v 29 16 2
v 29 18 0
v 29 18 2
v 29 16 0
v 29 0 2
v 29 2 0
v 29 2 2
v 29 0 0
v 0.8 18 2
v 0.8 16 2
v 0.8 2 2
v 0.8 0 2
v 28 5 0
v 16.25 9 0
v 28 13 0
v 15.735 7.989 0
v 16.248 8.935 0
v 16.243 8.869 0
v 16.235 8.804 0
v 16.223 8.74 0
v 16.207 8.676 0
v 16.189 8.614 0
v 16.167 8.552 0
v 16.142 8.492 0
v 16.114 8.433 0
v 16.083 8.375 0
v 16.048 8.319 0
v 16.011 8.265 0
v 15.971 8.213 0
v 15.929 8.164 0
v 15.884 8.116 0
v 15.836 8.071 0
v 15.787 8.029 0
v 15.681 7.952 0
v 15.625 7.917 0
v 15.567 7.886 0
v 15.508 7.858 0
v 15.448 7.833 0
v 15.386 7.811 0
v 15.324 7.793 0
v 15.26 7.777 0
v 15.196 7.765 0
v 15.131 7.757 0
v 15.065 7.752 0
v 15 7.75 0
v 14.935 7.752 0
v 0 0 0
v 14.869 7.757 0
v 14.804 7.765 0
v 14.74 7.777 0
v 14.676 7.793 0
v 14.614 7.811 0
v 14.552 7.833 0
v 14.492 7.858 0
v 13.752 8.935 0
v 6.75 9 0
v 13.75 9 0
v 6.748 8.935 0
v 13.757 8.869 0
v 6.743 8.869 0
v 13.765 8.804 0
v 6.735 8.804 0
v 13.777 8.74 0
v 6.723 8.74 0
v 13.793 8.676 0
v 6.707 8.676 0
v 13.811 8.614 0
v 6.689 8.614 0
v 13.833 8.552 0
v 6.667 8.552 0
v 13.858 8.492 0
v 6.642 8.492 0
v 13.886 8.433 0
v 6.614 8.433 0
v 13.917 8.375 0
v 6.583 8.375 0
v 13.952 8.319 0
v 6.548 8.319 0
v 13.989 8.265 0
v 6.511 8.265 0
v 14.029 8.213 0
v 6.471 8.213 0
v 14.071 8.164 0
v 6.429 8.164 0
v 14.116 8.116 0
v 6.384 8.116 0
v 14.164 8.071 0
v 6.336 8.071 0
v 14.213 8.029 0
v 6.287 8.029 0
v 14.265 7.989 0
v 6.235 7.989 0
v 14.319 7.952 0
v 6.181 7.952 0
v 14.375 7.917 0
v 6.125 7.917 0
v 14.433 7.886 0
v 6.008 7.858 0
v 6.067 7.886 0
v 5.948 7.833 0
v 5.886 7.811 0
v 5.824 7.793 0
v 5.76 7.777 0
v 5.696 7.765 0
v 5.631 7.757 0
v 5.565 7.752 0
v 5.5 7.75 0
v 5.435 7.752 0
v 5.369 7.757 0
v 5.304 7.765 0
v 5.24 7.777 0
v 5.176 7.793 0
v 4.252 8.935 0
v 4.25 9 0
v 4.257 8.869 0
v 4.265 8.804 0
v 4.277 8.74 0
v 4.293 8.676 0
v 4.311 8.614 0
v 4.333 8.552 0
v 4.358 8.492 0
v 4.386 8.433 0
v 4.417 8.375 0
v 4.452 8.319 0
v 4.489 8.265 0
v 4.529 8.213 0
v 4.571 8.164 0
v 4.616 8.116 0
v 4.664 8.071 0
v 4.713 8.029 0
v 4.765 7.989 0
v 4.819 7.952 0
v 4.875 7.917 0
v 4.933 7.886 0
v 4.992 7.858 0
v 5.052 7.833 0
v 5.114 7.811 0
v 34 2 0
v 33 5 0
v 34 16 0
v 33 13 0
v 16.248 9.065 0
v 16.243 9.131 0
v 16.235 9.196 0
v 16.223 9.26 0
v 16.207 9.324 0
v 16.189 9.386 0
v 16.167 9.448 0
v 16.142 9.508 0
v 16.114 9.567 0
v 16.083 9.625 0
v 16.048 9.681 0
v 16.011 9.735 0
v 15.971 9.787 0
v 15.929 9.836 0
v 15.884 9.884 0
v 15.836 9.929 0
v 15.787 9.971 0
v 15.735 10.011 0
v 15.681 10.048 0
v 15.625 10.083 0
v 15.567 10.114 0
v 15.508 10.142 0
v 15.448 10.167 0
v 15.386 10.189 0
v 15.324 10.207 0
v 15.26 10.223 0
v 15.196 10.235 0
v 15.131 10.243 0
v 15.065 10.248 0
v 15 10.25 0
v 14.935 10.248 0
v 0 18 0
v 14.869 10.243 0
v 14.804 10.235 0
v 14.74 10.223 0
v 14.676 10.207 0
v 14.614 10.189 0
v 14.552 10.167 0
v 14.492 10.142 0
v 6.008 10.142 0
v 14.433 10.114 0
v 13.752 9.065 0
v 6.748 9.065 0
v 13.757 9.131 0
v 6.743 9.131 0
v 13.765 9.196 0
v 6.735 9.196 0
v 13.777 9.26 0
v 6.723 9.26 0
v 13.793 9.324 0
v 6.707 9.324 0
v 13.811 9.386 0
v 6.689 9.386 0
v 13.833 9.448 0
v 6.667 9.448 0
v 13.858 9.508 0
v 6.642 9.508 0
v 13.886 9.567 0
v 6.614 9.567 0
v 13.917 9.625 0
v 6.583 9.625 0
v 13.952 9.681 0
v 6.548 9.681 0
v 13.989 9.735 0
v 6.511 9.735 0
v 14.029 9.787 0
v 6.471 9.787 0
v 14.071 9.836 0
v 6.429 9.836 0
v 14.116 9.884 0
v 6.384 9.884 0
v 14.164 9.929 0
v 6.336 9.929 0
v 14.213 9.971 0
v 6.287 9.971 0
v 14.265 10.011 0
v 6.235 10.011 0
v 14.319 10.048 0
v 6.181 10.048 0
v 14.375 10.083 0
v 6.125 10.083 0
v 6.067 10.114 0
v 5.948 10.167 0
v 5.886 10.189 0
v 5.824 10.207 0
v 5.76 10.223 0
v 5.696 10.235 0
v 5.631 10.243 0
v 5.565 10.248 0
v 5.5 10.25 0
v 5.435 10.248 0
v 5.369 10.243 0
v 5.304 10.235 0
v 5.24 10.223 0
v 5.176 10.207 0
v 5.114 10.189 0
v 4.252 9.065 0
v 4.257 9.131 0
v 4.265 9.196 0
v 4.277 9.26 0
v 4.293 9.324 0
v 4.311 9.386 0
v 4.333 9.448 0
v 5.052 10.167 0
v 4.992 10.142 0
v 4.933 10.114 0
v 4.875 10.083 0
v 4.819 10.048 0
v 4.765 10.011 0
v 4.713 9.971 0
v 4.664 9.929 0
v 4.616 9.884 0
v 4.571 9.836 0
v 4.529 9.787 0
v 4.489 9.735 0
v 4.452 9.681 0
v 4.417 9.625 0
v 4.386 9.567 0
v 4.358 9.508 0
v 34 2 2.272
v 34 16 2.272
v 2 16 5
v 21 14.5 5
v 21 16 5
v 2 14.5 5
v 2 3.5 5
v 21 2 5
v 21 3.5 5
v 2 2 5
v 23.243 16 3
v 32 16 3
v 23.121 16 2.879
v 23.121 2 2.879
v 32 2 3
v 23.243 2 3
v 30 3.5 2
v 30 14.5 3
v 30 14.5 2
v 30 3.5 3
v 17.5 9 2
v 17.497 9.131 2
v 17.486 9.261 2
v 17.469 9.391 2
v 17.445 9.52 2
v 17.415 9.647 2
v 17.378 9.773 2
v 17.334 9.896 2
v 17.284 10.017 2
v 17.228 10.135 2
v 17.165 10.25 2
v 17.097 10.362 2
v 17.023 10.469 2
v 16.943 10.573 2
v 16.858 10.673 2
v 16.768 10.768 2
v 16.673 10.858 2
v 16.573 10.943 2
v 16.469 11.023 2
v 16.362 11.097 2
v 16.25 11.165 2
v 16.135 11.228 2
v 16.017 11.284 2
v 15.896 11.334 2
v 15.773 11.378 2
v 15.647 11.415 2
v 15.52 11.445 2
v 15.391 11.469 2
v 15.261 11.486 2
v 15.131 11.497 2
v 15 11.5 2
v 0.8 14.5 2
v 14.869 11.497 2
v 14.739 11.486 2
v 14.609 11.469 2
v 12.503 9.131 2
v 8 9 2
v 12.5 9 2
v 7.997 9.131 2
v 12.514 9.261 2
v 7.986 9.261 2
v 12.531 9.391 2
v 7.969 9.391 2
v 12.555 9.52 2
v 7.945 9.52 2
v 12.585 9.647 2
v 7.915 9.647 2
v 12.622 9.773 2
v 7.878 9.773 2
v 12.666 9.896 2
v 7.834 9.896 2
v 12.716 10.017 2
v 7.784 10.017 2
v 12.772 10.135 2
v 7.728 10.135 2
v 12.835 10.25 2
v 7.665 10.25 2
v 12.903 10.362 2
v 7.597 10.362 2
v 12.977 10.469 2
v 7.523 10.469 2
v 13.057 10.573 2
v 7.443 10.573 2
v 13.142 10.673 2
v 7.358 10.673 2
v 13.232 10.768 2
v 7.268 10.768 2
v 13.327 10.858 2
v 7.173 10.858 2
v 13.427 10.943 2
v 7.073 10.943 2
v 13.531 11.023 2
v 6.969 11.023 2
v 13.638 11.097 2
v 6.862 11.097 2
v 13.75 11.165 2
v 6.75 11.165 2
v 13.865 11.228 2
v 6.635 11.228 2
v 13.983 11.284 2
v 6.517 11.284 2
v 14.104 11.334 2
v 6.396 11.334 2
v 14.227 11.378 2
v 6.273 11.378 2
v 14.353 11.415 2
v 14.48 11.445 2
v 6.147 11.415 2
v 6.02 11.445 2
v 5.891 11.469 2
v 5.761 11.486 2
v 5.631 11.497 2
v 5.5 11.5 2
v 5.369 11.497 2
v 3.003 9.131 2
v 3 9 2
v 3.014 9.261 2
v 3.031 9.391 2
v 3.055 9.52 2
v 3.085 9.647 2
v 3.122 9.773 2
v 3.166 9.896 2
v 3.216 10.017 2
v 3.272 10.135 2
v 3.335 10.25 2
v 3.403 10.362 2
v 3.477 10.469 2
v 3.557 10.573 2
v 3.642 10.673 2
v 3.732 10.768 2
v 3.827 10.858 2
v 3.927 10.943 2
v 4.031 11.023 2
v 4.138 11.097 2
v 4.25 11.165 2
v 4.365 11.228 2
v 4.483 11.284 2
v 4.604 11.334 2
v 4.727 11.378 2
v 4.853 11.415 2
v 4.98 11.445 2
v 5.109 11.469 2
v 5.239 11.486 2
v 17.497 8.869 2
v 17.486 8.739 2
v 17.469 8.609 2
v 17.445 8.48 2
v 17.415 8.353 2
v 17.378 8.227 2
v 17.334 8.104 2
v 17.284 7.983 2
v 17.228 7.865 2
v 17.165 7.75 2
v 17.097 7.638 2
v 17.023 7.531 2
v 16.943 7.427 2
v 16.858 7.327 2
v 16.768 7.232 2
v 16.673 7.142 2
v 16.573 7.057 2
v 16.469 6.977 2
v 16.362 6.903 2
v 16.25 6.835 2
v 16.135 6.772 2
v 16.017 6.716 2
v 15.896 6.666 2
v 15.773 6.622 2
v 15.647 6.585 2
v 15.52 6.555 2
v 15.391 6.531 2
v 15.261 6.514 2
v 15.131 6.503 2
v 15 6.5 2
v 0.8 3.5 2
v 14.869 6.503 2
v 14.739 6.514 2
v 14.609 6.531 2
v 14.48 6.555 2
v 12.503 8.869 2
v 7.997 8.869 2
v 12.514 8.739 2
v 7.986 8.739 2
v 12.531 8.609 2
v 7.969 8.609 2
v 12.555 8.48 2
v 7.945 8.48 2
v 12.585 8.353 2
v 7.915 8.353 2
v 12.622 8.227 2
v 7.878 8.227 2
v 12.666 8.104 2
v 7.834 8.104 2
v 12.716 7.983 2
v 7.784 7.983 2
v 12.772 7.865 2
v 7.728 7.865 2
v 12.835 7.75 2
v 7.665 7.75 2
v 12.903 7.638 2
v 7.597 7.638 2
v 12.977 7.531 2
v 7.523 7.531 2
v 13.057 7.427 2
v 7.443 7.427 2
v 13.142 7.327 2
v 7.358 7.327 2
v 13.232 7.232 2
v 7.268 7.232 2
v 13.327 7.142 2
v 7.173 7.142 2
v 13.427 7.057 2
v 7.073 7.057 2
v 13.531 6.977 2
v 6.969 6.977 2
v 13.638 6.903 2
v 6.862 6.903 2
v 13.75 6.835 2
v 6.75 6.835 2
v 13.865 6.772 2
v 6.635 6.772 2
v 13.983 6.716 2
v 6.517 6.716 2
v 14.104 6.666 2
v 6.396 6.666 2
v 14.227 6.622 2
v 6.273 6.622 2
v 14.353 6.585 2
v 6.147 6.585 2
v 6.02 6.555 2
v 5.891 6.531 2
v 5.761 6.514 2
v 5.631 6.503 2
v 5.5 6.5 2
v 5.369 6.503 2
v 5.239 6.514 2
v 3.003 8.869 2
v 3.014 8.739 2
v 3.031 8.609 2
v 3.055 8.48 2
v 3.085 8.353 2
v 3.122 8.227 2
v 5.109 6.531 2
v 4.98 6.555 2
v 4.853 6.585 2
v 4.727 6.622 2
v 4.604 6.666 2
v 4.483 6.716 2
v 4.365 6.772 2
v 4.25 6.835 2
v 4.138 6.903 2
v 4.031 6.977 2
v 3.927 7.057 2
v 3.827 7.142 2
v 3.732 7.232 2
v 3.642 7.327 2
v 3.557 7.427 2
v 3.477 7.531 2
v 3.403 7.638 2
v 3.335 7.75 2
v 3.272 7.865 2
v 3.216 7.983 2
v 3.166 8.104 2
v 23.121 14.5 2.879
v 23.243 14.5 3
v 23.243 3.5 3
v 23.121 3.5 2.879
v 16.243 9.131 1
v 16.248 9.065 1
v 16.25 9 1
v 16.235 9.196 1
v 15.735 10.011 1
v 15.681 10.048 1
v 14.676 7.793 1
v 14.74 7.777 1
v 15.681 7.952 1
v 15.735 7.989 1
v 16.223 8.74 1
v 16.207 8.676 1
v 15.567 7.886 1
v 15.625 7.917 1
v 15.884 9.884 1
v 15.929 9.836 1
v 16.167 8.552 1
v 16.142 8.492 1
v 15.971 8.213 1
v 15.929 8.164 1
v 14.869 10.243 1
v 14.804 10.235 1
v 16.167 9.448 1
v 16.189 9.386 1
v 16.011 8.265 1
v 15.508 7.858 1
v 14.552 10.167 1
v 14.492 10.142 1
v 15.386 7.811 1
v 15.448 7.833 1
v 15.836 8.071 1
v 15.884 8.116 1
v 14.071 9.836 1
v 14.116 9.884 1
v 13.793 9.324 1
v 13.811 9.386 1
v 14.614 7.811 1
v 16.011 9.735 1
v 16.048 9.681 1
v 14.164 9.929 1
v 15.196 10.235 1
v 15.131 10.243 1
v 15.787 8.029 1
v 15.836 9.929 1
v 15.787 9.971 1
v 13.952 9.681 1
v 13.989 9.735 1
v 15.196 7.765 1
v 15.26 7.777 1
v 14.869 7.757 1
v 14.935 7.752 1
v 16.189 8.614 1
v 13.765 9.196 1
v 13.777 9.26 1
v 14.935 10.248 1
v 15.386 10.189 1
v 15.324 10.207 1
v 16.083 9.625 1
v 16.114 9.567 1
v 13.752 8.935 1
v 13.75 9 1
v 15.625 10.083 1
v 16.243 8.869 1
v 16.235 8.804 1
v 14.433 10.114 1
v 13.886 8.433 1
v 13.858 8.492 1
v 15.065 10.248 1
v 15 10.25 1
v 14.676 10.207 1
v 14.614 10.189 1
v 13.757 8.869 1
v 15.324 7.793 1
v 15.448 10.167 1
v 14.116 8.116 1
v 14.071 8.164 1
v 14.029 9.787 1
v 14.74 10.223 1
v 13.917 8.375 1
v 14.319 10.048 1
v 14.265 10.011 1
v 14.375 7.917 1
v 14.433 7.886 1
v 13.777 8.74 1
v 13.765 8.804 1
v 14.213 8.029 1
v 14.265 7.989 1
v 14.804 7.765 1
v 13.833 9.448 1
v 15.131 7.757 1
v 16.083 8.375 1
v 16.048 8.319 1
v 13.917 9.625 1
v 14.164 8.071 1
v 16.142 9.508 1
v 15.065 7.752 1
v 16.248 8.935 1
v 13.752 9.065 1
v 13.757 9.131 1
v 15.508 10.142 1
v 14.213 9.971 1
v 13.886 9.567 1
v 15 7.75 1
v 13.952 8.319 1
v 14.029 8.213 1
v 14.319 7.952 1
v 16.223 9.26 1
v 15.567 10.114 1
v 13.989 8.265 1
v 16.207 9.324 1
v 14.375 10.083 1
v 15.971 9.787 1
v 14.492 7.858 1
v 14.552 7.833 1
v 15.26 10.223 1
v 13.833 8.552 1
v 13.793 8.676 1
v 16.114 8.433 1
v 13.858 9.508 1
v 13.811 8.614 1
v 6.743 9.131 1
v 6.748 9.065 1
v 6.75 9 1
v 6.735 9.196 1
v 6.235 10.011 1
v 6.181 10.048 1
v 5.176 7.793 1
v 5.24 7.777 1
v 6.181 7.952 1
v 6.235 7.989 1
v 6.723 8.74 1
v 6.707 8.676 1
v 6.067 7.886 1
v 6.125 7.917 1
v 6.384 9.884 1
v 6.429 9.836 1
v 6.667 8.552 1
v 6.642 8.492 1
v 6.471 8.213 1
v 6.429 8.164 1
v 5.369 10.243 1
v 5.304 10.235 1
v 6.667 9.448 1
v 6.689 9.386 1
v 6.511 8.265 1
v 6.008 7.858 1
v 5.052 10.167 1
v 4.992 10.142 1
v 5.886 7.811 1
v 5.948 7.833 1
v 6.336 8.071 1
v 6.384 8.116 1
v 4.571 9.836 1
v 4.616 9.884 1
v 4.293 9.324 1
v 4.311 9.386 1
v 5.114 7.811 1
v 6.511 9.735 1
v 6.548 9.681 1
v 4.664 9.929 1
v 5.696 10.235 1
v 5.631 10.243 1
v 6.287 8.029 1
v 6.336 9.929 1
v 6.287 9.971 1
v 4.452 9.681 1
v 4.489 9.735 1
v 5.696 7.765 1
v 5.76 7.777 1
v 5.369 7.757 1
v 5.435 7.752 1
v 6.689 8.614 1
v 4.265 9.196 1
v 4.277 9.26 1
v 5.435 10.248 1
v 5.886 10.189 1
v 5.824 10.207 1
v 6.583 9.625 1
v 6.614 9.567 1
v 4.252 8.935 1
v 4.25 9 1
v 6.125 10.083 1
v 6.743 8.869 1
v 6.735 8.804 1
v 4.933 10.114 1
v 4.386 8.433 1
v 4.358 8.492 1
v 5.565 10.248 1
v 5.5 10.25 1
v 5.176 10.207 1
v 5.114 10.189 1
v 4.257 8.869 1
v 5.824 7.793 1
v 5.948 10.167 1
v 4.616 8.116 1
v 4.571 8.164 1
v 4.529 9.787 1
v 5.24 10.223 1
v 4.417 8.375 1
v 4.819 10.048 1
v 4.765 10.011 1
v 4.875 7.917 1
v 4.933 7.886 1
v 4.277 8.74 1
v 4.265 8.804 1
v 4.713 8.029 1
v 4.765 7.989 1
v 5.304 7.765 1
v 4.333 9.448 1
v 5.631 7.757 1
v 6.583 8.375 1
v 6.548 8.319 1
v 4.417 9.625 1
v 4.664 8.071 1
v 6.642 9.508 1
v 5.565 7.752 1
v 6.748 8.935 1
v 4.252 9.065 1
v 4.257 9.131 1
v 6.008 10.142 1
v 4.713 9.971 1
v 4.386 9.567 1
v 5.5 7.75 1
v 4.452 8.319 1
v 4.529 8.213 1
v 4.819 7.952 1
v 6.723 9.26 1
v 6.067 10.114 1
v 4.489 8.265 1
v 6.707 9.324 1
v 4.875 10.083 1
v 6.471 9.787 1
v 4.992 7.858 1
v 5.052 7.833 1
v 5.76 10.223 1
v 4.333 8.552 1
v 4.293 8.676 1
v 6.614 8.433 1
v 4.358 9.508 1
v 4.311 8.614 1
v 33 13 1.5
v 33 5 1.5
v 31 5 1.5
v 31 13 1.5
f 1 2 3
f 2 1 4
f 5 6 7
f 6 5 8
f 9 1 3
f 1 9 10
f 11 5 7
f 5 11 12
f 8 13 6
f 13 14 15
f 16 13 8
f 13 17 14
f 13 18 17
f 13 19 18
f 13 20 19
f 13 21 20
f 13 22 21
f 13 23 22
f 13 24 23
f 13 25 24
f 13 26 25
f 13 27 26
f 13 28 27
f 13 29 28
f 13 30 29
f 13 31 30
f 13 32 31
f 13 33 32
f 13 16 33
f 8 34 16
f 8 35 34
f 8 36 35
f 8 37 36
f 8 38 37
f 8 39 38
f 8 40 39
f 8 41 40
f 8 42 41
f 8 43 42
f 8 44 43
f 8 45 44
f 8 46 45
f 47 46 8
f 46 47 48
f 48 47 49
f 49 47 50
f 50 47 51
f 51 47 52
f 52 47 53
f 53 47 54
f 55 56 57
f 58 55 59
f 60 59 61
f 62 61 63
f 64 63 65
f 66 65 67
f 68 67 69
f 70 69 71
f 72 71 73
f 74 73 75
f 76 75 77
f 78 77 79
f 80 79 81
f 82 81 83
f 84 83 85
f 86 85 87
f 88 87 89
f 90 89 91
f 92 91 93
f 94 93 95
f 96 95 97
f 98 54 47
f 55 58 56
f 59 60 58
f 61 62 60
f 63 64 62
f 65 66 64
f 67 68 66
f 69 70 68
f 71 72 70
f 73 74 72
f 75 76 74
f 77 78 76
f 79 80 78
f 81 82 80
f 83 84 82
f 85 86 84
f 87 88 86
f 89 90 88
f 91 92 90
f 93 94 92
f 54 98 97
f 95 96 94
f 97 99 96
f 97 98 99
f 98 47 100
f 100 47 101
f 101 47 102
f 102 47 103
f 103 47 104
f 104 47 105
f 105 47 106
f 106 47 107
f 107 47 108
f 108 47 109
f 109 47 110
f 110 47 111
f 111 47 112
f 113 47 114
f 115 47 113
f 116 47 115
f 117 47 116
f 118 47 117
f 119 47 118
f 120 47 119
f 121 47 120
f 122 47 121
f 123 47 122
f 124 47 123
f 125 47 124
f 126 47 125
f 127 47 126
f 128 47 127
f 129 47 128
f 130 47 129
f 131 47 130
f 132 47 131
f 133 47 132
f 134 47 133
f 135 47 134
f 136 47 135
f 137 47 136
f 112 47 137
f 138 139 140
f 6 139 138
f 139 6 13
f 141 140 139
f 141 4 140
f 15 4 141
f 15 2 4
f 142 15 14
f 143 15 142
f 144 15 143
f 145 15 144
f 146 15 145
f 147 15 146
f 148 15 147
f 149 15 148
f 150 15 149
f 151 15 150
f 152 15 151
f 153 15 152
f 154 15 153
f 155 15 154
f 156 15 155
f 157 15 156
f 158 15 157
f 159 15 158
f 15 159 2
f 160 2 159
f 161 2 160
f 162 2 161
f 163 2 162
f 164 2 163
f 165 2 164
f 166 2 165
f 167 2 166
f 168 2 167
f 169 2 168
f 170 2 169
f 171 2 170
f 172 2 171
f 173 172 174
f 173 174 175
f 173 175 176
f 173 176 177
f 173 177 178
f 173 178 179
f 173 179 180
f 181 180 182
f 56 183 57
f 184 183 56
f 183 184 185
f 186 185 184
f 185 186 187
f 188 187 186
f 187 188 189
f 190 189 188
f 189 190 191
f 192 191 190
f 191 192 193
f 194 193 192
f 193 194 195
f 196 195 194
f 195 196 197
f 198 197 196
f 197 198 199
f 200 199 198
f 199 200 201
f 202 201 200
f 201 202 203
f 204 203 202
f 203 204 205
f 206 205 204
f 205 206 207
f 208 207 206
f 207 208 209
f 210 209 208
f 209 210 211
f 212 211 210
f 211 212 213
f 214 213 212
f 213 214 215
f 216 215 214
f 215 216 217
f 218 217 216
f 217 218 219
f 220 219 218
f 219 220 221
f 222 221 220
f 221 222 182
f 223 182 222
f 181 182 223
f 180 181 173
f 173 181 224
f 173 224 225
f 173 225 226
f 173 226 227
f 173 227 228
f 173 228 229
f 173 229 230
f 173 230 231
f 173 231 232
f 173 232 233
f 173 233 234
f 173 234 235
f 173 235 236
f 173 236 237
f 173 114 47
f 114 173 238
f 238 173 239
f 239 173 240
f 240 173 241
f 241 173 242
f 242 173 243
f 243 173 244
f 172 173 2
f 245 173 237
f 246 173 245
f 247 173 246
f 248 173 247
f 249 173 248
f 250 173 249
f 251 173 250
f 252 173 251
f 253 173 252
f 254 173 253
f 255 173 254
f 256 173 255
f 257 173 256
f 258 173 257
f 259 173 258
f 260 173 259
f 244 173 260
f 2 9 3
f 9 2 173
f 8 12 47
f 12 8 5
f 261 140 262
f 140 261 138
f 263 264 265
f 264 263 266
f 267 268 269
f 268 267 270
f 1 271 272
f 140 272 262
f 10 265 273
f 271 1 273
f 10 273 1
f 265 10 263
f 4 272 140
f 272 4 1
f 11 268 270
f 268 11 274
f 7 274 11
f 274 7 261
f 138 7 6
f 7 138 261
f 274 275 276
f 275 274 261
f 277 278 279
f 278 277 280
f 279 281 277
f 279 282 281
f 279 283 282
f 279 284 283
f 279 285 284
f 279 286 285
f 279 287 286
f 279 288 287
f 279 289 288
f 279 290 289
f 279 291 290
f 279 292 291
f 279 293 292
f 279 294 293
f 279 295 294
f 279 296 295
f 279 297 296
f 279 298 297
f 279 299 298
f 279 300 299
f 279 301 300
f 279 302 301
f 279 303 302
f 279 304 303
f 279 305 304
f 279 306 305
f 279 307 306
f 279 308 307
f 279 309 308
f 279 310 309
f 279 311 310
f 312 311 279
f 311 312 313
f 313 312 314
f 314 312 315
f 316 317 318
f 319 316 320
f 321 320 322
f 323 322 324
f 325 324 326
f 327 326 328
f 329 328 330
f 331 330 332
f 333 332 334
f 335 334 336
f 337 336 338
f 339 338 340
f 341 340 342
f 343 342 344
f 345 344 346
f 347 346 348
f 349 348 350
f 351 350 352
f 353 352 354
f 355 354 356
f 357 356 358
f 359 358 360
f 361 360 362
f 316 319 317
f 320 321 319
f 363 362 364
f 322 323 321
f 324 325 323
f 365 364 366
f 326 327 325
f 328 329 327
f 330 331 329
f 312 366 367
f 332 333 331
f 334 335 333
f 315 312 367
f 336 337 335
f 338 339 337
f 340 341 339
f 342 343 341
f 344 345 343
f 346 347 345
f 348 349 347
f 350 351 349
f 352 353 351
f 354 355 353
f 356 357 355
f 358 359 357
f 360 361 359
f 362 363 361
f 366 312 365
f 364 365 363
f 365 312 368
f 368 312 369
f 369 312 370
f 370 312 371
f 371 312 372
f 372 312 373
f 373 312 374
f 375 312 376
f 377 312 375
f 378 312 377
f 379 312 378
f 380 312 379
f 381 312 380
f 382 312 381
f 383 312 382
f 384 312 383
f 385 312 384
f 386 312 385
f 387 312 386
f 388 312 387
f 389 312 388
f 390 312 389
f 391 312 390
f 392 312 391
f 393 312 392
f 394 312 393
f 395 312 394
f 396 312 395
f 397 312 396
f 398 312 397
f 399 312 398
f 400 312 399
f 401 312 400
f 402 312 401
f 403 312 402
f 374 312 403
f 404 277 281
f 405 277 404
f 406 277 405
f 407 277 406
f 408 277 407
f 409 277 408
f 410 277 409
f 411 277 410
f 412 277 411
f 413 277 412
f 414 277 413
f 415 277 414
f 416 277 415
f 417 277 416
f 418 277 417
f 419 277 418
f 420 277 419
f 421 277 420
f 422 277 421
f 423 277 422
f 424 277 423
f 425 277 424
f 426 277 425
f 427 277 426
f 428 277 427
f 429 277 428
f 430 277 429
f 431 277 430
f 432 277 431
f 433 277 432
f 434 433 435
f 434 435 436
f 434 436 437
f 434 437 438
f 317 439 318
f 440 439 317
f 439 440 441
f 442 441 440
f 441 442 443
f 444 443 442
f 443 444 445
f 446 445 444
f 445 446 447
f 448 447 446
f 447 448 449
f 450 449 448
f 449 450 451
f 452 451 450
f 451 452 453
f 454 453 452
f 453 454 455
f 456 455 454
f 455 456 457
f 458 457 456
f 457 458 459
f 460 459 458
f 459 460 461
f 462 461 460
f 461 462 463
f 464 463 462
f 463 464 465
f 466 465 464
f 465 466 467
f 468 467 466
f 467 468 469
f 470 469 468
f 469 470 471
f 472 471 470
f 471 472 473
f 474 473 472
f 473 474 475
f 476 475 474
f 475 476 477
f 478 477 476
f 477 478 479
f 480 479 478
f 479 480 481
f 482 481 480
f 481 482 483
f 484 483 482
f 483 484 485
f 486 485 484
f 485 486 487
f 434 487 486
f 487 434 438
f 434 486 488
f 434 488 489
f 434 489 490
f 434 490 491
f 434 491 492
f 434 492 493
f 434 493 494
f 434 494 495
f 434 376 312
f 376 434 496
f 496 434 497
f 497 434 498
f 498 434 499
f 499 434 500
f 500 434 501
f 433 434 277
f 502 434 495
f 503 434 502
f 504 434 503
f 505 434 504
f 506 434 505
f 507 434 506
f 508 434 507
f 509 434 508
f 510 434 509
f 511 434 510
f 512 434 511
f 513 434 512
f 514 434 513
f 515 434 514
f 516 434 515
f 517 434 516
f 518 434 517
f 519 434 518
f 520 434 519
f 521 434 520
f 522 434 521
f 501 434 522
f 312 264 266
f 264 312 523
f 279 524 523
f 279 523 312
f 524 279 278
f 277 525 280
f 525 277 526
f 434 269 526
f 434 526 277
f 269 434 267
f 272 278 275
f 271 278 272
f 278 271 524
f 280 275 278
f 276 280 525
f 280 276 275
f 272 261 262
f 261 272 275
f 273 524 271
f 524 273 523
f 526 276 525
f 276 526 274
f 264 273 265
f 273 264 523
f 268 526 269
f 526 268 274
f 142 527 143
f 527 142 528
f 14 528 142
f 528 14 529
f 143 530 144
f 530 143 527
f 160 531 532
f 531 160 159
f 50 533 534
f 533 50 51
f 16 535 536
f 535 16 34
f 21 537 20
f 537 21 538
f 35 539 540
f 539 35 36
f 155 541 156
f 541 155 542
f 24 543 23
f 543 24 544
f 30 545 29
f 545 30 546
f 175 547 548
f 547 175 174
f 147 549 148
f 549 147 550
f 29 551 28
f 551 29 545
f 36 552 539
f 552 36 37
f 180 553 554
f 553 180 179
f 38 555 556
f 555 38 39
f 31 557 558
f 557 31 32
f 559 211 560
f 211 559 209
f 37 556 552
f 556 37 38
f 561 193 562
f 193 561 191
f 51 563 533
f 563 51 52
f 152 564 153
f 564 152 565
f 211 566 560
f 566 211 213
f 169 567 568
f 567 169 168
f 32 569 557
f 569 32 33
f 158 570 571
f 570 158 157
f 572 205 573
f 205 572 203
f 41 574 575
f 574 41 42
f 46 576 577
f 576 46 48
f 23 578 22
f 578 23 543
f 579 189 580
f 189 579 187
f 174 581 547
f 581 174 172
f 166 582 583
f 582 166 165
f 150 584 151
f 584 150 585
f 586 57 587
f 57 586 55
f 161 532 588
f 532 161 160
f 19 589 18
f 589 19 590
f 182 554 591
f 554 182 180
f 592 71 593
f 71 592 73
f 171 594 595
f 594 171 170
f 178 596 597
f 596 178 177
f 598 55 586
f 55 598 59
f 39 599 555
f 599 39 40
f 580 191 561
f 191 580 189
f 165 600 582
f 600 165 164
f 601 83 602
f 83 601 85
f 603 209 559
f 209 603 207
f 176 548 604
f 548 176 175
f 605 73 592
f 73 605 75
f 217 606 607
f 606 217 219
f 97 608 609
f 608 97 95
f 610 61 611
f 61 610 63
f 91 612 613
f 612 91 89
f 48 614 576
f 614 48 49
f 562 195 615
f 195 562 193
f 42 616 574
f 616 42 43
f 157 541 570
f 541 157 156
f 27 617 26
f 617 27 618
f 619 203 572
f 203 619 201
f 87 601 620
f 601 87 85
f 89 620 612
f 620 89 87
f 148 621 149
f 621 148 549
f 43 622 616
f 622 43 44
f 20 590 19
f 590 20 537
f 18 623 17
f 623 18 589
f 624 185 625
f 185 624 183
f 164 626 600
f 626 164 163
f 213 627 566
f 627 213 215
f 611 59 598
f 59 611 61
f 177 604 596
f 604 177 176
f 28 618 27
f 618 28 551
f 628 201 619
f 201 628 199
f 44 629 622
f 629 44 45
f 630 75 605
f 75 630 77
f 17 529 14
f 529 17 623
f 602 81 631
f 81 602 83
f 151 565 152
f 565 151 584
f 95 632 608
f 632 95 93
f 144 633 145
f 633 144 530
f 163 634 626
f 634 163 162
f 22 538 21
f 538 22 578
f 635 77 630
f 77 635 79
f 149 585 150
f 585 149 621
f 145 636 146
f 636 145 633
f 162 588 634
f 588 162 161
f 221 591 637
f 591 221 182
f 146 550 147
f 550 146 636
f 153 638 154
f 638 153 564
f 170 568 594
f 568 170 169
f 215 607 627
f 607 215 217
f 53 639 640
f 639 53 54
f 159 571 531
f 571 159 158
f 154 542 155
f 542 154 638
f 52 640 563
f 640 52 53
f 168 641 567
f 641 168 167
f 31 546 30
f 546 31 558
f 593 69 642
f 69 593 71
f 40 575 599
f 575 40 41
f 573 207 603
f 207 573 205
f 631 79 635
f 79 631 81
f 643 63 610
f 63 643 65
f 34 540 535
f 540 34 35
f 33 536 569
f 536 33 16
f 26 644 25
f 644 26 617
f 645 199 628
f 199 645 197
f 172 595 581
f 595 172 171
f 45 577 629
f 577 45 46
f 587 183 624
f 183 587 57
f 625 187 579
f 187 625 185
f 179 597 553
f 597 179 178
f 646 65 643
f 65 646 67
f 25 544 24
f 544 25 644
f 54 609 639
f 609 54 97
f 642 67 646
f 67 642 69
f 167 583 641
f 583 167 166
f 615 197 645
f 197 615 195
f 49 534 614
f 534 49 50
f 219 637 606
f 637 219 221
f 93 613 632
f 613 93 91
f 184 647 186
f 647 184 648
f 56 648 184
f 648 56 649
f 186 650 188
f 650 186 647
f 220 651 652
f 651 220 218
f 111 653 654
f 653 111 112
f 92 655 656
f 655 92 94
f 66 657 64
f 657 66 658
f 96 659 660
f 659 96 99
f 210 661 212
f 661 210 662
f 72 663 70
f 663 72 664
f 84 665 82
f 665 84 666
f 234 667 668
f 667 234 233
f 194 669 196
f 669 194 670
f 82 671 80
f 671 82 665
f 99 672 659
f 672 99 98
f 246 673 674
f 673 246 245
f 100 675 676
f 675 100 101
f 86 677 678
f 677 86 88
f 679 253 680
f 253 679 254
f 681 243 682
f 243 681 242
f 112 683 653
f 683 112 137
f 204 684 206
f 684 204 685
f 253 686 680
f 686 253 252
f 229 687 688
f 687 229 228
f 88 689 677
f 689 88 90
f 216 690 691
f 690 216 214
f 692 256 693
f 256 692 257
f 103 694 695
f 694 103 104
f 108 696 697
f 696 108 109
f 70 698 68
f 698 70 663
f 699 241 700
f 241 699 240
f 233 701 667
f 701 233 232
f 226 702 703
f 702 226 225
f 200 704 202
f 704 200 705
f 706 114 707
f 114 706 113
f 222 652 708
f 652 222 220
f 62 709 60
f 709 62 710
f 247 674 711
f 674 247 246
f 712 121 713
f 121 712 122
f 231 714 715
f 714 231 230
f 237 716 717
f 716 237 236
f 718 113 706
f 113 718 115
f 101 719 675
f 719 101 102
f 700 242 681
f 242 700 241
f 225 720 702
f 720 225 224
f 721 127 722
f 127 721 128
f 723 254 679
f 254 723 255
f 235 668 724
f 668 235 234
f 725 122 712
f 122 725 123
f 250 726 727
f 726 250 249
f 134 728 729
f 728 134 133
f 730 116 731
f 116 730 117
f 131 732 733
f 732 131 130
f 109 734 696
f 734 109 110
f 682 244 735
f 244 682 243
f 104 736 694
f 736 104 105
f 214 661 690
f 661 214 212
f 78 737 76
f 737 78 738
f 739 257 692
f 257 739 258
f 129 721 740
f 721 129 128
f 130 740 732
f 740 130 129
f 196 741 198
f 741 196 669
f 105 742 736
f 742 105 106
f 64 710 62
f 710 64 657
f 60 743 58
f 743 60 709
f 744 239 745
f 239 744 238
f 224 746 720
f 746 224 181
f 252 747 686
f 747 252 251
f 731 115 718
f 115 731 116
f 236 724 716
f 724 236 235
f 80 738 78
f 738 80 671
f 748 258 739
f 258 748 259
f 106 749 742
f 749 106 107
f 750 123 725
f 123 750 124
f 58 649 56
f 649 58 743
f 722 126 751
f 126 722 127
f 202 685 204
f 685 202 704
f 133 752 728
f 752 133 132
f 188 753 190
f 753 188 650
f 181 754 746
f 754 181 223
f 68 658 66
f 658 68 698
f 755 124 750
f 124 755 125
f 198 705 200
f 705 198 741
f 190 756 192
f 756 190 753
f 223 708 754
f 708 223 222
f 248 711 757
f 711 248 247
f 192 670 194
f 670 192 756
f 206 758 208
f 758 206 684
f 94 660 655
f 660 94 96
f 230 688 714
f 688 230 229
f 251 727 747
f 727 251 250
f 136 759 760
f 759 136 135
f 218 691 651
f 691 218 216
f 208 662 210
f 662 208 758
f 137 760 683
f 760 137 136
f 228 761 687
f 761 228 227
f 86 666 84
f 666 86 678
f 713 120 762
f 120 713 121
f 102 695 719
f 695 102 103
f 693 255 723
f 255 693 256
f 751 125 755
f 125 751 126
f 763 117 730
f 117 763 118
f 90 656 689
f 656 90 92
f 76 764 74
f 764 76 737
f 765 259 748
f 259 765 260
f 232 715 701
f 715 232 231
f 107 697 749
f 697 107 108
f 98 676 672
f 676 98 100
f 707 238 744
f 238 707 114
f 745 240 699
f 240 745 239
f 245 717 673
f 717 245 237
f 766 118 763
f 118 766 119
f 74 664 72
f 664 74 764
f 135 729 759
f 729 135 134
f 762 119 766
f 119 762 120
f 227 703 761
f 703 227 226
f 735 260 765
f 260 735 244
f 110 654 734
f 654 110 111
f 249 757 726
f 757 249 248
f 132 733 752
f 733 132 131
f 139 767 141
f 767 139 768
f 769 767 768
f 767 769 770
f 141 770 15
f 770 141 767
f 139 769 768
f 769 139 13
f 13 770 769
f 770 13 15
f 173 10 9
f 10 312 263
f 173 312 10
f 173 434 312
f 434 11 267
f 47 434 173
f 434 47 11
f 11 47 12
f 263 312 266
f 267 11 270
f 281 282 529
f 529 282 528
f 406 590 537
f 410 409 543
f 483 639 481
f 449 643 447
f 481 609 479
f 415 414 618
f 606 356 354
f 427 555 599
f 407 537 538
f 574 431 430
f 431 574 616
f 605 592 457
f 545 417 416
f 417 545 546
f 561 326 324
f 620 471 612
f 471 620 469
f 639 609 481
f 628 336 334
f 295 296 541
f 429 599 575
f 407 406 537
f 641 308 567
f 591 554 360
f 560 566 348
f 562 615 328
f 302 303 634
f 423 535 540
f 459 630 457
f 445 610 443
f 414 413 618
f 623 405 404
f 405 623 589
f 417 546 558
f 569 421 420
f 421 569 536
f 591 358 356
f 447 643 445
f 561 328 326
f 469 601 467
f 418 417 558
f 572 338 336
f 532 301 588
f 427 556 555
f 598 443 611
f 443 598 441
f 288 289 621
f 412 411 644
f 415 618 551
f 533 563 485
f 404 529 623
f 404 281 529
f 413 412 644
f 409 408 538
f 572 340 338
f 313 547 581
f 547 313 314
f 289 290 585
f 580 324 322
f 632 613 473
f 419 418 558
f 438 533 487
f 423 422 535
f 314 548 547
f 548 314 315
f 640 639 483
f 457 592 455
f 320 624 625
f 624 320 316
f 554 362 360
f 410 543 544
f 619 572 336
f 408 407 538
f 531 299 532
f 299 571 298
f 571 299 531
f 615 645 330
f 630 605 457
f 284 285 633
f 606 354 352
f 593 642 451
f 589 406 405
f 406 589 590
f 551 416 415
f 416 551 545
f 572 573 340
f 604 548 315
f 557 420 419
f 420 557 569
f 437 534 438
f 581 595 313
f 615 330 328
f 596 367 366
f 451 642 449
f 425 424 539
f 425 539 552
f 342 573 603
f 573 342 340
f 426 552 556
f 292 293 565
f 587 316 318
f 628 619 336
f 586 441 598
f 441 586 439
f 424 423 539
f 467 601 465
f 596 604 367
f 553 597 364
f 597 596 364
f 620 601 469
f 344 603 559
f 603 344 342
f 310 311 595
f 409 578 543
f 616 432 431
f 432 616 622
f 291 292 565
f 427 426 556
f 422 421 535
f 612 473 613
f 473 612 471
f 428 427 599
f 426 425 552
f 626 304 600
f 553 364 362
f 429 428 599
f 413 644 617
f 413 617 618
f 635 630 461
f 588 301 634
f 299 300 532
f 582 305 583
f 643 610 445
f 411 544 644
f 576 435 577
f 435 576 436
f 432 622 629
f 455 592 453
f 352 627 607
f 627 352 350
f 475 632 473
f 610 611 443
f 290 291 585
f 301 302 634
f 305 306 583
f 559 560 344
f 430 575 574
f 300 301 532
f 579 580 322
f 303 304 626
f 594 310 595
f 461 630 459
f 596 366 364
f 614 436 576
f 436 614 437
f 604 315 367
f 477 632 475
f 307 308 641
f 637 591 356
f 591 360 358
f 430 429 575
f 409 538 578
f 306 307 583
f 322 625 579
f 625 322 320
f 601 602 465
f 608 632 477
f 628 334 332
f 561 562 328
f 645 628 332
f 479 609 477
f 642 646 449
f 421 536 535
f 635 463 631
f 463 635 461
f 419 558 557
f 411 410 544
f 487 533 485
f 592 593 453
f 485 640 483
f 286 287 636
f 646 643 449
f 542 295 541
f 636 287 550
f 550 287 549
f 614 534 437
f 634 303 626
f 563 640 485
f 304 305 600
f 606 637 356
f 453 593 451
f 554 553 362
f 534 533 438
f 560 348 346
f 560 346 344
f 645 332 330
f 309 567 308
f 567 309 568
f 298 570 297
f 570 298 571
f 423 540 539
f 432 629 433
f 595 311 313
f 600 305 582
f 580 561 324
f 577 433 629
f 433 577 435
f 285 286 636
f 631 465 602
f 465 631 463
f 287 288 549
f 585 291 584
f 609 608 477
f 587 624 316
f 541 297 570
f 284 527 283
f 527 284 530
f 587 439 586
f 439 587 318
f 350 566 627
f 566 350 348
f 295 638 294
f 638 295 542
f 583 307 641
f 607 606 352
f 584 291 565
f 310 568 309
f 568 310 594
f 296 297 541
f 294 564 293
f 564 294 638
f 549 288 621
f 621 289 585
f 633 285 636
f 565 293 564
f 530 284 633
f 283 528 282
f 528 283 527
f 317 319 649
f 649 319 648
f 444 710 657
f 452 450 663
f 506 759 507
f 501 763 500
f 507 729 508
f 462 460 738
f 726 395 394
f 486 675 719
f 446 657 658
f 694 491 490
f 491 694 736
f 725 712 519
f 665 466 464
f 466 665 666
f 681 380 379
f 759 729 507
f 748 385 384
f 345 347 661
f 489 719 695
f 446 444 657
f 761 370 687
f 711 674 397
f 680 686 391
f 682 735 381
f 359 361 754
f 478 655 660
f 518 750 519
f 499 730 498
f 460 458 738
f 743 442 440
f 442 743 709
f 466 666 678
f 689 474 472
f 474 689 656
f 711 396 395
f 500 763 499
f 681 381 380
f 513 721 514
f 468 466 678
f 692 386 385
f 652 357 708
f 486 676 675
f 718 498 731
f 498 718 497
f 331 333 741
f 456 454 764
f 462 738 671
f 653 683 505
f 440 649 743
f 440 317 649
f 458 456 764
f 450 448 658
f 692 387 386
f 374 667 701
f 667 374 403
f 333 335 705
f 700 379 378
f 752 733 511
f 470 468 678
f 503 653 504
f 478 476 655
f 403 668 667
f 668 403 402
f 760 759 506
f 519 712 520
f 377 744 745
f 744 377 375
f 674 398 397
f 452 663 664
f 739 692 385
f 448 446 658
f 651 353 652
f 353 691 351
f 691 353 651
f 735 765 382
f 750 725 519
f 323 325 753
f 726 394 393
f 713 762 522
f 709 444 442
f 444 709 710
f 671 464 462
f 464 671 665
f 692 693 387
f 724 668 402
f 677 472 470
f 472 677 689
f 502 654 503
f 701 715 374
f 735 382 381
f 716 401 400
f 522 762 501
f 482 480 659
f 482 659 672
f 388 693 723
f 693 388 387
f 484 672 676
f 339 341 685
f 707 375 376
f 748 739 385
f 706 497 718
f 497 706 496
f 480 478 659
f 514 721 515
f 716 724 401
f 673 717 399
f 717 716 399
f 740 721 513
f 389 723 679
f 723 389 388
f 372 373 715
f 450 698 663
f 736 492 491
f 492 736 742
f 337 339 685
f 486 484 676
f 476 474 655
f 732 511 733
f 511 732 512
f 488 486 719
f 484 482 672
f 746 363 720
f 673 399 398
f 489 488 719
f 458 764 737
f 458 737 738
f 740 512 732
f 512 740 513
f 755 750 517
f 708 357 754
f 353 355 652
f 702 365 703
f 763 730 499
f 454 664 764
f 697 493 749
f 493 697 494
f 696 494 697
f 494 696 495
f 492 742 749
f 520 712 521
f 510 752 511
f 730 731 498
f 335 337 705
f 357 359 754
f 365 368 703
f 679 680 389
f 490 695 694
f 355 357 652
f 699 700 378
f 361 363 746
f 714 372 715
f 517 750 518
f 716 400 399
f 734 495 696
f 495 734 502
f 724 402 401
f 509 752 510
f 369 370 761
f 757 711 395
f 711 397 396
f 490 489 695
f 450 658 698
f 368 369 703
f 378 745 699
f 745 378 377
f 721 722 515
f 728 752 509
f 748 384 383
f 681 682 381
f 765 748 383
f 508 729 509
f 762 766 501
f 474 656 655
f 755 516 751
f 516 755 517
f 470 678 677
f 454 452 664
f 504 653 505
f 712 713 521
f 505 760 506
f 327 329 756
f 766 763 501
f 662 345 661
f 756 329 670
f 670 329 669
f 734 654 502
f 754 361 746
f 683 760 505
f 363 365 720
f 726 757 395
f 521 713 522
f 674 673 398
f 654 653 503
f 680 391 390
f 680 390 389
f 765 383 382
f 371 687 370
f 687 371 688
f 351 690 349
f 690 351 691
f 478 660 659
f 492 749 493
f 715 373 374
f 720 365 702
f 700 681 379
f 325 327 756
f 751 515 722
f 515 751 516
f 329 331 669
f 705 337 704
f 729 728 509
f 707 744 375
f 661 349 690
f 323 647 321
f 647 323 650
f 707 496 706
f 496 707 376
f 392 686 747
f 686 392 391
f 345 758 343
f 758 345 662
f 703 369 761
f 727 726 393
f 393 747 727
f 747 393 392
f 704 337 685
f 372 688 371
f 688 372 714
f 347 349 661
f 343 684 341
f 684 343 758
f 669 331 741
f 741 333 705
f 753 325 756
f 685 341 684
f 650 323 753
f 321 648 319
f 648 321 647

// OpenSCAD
$fn=120;

basel=29;
basew=18;
baseh=2;

inbasel=34;
inbasew=14;
inbaseh=5;

cut1l=30;
cut1w=11;
cut1h=5;
cut1z=baseh;

cut2l=11;
cut2w=basew;
cut2h=5;
cut2z=3;

hole1x=inbasel-19;
hole2x=hole1x-9.5;
holer=2.5/2;


clpl=2;
clpw=8;
clph=1.5;

clpx=inbasel-1-clpl;
clpslx=3;

//couter sink
csw=5/2;
csd=1;

difference(){
difference(){
difference(){
difference(){
difference(){
difference(){
difference(){
difference(){
difference(){
difference(){
    //main base plus upper portion
union(){
        cube([basel,basew,baseh]);
        translate([0,(basew-inbasew)/2,0])
        cube([inbasel,inbasew,inbaseh]);
}
    //cutout1
    translate([0,(basew-cut1w)/2,cut1z])
    cube([cut1l,cut1w,cut1h]);
}
    //cutout2
    translate([(inbasel-cut2l),(basew-cut2w)/2,cut2z])
    cube([cut2l,cut2w,cut2h]);
}
    //cutout3 slant front
    translate([inbasel-2,0,3,])
    rotate(a=[0,20,0])
    cube([3,basew,3]);
}
    //cutout3 slant front
    translate([(inbasel-cut2l)-2,0,5,])
    rotate(a=[0,45,0])
    cube([3,basew,3]);
}
    //hole1
    translate([hole1x,basew/2,0])
    cylinder(h=10,r=holer);
}
    //hole2
    translate([hole2x,basew/2,0])
    cylinder(h=10,r=holer);
}
    //clip cutout
    translate([clpx,(basew-clpw)/2,0])
    union(){
    cube([clpl,clpw,clph]);
    rotate(a=[-90,0,0])
    linear_extrude(height=clpw)
    polygon(points=[[0,0],[0,-clph],[-clpslx,0]]);
    }
}
    //backcut
    rotate(a=[-90,0,0])
    linear_extrude(height=basew)
    polygon(points=[[0,0],[0,-inbaseh],[2,-inbaseh]]);

}
    //countersink2
    translate([hole1x,basew/2,baseh-csd])
    cylinder(h=csd,r1=holer,r2=csw,center=false);
}
    //countersink2
    translate([hole2x,basew/2,baseh-csd])
    cylinder(h=csd,r1=holer,r2=csw,center=false);
}
